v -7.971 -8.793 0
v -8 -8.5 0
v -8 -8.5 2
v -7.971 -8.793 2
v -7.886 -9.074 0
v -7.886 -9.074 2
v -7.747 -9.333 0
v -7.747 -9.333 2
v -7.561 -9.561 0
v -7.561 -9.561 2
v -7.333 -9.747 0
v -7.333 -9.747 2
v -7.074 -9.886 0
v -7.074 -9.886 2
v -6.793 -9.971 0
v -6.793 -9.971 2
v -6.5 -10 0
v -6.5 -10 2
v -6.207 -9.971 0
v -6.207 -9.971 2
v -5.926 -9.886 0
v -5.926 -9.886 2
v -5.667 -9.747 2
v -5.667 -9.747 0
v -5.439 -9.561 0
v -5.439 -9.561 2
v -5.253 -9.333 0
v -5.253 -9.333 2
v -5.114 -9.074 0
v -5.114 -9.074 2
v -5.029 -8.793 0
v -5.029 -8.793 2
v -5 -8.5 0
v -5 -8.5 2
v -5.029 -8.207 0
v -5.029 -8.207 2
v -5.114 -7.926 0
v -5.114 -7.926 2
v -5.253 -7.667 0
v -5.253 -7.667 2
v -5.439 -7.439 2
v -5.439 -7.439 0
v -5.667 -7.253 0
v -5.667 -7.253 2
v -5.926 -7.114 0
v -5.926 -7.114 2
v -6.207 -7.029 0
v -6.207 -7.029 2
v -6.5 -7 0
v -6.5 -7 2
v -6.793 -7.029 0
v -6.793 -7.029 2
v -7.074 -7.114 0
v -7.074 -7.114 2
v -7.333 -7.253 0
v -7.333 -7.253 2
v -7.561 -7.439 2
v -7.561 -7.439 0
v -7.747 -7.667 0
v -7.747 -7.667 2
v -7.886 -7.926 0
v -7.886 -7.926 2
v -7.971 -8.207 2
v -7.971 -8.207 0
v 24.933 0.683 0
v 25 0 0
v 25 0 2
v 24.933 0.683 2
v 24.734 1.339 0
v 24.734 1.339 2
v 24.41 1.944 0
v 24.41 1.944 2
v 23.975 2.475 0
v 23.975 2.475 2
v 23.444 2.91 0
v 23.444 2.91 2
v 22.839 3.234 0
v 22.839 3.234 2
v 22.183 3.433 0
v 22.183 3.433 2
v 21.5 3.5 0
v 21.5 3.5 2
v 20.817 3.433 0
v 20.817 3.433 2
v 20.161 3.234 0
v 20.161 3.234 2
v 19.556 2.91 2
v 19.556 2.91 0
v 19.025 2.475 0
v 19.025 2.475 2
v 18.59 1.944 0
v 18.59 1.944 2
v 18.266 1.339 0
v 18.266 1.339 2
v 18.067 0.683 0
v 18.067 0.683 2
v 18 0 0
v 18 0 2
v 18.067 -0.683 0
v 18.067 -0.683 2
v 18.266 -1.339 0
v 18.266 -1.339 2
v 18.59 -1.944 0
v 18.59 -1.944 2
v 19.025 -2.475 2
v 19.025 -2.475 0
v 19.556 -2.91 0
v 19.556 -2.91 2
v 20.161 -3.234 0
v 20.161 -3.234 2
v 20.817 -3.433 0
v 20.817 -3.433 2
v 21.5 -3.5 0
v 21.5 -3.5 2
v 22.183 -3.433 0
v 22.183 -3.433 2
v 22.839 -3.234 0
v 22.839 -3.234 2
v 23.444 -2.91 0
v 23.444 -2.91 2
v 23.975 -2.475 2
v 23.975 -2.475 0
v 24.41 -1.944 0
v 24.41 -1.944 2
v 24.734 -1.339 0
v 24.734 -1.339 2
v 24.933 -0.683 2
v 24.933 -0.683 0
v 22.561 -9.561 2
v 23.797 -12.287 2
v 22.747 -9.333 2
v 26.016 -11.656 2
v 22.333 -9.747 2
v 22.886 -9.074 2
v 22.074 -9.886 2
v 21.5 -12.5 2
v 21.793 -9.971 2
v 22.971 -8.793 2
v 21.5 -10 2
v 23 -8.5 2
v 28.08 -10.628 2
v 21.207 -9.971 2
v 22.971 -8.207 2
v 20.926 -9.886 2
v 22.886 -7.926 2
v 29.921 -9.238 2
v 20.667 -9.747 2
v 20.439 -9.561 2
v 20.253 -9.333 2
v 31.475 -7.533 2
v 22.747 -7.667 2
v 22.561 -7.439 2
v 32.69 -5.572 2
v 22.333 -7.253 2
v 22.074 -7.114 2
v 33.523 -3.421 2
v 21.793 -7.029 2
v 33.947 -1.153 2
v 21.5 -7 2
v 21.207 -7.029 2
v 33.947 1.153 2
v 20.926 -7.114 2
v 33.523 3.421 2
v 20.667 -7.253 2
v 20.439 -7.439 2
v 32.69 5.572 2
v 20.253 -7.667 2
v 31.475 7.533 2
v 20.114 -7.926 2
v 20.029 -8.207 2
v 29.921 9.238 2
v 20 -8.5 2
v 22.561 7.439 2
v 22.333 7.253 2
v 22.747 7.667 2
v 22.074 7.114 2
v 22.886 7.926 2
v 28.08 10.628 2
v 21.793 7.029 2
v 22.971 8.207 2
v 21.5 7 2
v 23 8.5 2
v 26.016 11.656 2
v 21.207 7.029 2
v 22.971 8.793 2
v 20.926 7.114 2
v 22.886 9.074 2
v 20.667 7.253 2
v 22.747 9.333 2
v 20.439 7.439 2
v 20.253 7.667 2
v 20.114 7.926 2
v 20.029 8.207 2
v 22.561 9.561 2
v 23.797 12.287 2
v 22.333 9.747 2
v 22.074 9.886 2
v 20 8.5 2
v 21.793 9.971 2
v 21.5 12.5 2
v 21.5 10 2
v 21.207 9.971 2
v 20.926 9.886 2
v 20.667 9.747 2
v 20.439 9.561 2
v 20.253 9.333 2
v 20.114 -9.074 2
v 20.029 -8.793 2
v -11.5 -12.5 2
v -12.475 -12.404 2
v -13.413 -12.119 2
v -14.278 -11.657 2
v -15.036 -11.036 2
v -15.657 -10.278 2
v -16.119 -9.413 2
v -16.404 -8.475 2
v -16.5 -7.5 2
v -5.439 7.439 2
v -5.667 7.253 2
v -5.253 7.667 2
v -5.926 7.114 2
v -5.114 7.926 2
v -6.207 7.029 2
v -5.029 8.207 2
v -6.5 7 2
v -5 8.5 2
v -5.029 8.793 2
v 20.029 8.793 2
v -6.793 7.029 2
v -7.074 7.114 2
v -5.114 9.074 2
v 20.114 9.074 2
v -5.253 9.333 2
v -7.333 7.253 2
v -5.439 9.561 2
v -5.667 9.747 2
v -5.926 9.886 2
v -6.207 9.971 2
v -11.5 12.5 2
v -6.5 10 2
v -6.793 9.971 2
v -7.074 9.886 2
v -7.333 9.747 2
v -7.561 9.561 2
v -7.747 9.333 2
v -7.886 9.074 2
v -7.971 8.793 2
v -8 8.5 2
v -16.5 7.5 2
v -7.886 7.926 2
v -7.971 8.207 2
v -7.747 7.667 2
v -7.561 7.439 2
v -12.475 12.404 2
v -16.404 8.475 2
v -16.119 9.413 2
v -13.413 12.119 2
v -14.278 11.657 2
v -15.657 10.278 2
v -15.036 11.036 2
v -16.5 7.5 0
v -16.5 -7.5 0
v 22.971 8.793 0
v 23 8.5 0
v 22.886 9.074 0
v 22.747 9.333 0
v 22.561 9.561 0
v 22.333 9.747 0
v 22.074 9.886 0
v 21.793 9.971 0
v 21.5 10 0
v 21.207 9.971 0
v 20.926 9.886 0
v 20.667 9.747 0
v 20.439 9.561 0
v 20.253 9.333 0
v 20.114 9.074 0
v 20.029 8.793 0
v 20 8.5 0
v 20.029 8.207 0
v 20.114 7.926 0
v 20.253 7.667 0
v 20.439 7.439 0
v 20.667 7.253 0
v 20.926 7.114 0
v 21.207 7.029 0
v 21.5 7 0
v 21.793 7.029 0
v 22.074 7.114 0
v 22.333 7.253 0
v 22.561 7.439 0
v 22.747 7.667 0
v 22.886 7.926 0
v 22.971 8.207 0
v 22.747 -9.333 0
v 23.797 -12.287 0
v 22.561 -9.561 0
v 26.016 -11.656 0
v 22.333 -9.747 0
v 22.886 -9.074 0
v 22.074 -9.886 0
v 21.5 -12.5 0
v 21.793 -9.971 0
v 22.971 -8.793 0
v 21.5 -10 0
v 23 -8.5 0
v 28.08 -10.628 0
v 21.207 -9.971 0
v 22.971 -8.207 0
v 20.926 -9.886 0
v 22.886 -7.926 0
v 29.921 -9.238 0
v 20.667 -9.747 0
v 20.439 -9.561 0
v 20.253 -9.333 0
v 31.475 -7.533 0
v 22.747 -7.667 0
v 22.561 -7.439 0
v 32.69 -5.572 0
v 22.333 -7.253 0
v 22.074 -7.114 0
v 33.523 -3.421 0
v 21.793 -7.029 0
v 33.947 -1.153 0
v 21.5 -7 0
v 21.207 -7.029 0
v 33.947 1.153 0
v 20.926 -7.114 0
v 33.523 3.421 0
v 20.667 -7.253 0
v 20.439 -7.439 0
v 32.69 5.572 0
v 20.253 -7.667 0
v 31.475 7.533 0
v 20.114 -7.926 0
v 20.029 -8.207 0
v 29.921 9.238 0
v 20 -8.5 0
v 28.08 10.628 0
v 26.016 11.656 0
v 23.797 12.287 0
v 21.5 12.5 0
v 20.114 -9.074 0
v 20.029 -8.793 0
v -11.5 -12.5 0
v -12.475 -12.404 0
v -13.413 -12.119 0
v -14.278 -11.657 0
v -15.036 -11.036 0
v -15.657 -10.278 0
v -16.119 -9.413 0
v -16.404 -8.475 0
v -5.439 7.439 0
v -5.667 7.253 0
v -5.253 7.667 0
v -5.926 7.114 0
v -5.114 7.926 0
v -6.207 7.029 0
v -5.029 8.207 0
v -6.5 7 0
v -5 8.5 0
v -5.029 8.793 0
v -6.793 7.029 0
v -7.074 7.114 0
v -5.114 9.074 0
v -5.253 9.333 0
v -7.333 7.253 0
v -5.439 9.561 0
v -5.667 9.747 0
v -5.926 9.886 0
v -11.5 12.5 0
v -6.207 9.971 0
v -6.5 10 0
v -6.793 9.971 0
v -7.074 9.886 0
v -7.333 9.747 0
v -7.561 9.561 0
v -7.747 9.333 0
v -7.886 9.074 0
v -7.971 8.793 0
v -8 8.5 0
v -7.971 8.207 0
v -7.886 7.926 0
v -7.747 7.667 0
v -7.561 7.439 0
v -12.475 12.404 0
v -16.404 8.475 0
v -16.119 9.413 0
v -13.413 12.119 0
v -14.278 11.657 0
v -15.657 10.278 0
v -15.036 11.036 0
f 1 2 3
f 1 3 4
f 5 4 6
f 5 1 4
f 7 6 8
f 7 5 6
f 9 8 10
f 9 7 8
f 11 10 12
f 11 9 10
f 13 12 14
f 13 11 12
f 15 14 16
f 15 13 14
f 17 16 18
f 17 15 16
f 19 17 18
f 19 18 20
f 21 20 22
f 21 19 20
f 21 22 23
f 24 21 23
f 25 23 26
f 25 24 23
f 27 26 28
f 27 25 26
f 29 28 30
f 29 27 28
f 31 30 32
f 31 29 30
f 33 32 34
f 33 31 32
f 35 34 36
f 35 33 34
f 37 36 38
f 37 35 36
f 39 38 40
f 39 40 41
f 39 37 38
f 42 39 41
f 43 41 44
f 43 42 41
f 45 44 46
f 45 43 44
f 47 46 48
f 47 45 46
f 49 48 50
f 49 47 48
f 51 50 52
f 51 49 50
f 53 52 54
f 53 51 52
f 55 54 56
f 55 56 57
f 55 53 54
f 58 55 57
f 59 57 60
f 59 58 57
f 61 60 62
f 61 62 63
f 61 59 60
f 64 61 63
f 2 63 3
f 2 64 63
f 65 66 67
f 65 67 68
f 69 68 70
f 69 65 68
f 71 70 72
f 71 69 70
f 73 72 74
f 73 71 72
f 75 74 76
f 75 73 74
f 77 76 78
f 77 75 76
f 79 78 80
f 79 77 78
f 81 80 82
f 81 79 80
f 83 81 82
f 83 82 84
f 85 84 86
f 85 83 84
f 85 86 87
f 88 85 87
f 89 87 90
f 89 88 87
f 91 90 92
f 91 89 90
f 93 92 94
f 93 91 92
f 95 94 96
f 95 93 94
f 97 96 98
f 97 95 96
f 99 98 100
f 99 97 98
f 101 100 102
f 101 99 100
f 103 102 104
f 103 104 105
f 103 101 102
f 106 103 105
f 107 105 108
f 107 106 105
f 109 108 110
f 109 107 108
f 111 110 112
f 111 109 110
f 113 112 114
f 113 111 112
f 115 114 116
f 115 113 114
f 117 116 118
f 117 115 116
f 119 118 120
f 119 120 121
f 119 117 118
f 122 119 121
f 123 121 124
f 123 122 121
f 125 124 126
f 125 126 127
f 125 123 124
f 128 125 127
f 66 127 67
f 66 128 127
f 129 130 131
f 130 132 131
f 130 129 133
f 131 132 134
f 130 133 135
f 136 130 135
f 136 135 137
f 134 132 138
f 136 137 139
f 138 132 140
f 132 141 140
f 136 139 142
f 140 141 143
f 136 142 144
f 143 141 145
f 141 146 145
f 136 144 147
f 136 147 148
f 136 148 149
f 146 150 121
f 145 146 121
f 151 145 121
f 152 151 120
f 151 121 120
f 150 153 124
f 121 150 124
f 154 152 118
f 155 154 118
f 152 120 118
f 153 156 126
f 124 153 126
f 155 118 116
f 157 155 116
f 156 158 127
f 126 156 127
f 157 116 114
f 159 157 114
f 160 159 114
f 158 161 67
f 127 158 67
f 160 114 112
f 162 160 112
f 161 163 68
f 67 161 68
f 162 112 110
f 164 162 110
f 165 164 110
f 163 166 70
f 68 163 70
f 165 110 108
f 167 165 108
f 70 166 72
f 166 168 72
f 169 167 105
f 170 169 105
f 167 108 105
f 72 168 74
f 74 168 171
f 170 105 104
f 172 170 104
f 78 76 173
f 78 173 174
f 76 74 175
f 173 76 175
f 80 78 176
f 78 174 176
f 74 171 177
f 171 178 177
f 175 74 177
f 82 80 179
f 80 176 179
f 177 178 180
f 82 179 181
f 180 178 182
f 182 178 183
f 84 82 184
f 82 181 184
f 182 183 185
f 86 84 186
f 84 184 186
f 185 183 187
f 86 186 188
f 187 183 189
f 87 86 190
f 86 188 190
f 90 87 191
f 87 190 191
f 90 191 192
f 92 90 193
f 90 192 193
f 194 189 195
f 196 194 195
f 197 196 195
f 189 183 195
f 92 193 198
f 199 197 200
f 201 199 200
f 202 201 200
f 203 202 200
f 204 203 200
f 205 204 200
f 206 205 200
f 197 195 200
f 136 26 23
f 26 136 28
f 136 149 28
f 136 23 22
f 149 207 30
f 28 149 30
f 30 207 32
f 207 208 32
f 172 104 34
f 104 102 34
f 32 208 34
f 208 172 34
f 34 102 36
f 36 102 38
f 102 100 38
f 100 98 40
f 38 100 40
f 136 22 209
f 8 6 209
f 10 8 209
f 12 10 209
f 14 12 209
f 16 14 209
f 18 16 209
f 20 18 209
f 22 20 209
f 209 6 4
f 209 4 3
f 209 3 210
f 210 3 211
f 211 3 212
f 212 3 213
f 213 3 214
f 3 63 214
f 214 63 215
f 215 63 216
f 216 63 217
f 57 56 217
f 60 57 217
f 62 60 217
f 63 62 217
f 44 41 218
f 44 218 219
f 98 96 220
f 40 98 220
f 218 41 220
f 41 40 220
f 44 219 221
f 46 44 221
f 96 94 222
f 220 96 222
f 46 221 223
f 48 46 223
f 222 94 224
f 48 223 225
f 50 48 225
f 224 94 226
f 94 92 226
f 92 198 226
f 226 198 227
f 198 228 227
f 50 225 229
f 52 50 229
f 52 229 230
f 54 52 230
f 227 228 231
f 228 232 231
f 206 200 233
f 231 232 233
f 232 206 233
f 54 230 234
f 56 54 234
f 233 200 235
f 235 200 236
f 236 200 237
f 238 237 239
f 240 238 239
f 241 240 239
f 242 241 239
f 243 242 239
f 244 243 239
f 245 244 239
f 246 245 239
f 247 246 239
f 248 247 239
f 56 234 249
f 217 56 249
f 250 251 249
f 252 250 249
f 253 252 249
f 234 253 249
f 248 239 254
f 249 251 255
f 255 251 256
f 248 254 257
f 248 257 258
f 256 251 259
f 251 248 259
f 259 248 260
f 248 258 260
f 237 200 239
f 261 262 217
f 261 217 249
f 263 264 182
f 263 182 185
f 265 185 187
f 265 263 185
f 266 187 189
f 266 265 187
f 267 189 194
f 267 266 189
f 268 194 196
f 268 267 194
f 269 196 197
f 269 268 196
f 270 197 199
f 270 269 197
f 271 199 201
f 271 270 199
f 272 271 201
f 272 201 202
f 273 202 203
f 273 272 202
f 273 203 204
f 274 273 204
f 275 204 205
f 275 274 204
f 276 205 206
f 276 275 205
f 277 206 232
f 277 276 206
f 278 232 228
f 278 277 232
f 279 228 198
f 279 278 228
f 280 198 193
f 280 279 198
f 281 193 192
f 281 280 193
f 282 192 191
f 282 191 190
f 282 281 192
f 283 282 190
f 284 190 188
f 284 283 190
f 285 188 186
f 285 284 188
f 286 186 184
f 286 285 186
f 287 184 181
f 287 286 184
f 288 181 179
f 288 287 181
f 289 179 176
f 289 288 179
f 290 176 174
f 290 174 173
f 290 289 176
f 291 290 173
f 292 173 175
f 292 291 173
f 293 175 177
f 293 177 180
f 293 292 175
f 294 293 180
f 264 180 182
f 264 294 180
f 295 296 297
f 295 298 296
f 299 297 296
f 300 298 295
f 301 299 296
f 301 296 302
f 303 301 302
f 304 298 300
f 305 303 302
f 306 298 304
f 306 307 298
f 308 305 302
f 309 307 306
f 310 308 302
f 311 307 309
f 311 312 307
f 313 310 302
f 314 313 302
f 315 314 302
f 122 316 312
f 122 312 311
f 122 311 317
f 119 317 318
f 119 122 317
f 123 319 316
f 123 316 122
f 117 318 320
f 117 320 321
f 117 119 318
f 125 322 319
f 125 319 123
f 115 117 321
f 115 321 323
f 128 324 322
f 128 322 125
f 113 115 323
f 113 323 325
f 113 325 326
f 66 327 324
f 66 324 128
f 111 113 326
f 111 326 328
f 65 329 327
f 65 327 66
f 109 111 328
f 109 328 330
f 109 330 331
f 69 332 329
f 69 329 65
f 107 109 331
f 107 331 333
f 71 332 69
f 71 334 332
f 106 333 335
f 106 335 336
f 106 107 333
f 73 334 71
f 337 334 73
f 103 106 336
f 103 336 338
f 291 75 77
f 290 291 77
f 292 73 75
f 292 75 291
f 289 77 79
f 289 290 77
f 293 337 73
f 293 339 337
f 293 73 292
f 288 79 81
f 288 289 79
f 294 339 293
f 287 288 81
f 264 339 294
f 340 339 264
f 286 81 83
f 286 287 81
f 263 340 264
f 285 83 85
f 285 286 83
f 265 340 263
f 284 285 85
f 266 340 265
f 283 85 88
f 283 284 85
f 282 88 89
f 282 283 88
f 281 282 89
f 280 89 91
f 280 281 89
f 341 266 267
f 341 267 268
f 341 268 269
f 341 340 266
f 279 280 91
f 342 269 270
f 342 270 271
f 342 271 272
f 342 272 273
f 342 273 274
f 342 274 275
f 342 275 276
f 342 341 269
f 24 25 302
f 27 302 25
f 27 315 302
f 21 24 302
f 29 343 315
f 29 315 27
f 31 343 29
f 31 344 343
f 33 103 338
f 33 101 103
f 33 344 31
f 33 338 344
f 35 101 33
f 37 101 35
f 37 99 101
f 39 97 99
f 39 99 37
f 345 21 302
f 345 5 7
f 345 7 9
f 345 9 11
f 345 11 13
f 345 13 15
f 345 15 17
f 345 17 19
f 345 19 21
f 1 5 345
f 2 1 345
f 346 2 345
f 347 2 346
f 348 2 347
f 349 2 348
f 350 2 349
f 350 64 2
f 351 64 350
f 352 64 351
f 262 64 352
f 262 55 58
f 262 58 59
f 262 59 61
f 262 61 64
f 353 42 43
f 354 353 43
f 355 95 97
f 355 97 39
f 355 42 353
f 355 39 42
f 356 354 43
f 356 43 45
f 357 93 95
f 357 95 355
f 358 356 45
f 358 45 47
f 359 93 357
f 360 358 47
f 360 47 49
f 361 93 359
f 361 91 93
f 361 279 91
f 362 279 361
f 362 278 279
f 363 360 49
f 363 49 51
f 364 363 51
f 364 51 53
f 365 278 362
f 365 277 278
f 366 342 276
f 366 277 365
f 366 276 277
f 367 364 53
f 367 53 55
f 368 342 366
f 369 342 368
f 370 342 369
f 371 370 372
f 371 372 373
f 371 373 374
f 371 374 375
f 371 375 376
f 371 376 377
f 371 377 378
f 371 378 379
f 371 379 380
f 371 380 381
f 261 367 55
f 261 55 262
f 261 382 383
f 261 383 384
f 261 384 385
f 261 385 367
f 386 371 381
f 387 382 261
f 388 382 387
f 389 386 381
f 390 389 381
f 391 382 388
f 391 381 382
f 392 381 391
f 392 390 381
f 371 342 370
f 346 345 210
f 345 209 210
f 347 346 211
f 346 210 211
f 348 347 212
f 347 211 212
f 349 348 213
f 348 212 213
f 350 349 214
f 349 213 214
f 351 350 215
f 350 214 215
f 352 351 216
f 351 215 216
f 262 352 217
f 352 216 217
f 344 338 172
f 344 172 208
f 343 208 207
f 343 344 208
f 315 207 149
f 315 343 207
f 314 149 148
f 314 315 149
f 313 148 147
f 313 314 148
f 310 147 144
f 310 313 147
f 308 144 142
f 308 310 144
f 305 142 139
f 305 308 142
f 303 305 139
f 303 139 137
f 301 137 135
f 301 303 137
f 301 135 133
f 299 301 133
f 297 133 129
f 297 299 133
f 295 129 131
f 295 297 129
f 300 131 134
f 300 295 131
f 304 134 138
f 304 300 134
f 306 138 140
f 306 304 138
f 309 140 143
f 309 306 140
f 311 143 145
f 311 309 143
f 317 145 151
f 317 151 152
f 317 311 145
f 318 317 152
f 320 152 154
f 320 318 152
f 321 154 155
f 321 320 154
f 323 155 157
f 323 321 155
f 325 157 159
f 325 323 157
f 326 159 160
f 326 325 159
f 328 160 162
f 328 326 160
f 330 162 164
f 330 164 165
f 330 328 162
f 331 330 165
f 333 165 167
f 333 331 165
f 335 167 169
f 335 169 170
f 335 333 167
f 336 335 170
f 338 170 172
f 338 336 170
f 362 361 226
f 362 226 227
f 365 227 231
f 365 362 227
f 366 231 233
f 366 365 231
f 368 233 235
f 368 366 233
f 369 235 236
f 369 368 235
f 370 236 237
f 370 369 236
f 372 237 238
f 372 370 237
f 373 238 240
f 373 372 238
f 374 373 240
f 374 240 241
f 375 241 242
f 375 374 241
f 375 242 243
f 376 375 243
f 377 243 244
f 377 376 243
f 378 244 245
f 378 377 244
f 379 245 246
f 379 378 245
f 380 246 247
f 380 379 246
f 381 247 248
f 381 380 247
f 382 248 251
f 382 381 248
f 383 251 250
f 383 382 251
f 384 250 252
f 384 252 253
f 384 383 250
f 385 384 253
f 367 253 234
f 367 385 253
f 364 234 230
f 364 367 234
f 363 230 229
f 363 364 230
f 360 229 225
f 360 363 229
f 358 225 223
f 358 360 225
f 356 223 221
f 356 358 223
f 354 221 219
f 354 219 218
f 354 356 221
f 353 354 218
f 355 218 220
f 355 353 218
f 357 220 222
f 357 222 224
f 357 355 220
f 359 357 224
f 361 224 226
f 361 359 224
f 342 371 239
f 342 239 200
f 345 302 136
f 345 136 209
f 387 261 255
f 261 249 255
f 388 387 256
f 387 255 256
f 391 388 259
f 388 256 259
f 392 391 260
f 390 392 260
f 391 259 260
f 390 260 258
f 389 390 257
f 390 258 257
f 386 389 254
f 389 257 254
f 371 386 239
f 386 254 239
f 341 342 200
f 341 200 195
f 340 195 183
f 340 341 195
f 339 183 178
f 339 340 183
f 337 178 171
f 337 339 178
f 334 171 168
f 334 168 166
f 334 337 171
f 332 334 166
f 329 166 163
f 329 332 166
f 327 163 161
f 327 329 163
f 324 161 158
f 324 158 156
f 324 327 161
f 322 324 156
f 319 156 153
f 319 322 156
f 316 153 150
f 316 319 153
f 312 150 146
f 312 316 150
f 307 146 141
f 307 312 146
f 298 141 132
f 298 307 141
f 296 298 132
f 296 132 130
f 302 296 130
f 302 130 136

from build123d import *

# Parameters (mm, degrees)
SKETCH_1_R      = 3.5
SKETCH_1_R_2    = 1.5
EXTRUDE_1_DEPTH = 2
FILLET_1_R      = 5


with BuildPart() as part:
    # 草图1 → 凸台-拉伸1 (new body)
    with BuildSketch(Plane.XY):
        with BuildLine():
            Line((21.5, -12.5), (-16.5, -12.5))
            Line((-16.5, -12.5), (-16.5, 12.5))
            Line((-16.5, 12.5), (21.5, 12.5))
            ThreePointArc((21.5, 12.5), (34, 0), (21.5, -12.5))
        make_face()
        with Locations((21.5, 0)):
            Circle(SKETCH_1_R, mode=Mode.SUBTRACT)
        with Locations((21.5, 8.5)):
            Circle(SKETCH_1_R_2, mode=Mode.SUBTRACT)
        with Locations(Location((21.5, -8.5, 0), (0, 0, 180))):
            Circle(SKETCH_1_R_2, mode=Mode.SUBTRACT)
        with Locations((-6.5, 8.5)):
            Circle(SKETCH_1_R_2, mode=Mode.SUBTRACT)
        with Locations(Location((-6.5, -8.5, 0), (0, 0, 180))):
            Circle(SKETCH_1_R_2, mode=Mode.SUBTRACT)
    extrude(amount=EXTRUDE_1_DEPTH)

    # 圆角1
    fillet_1_edges = [part.edges().sort_by_distance(p)[0] for p in [
        (-16.5, 12.5, 1),
        (-16.5, -12.5, 1),
    ]]
    fillet(fillet_1_edges, radius=FILLET_1_R)


solid = part.part
